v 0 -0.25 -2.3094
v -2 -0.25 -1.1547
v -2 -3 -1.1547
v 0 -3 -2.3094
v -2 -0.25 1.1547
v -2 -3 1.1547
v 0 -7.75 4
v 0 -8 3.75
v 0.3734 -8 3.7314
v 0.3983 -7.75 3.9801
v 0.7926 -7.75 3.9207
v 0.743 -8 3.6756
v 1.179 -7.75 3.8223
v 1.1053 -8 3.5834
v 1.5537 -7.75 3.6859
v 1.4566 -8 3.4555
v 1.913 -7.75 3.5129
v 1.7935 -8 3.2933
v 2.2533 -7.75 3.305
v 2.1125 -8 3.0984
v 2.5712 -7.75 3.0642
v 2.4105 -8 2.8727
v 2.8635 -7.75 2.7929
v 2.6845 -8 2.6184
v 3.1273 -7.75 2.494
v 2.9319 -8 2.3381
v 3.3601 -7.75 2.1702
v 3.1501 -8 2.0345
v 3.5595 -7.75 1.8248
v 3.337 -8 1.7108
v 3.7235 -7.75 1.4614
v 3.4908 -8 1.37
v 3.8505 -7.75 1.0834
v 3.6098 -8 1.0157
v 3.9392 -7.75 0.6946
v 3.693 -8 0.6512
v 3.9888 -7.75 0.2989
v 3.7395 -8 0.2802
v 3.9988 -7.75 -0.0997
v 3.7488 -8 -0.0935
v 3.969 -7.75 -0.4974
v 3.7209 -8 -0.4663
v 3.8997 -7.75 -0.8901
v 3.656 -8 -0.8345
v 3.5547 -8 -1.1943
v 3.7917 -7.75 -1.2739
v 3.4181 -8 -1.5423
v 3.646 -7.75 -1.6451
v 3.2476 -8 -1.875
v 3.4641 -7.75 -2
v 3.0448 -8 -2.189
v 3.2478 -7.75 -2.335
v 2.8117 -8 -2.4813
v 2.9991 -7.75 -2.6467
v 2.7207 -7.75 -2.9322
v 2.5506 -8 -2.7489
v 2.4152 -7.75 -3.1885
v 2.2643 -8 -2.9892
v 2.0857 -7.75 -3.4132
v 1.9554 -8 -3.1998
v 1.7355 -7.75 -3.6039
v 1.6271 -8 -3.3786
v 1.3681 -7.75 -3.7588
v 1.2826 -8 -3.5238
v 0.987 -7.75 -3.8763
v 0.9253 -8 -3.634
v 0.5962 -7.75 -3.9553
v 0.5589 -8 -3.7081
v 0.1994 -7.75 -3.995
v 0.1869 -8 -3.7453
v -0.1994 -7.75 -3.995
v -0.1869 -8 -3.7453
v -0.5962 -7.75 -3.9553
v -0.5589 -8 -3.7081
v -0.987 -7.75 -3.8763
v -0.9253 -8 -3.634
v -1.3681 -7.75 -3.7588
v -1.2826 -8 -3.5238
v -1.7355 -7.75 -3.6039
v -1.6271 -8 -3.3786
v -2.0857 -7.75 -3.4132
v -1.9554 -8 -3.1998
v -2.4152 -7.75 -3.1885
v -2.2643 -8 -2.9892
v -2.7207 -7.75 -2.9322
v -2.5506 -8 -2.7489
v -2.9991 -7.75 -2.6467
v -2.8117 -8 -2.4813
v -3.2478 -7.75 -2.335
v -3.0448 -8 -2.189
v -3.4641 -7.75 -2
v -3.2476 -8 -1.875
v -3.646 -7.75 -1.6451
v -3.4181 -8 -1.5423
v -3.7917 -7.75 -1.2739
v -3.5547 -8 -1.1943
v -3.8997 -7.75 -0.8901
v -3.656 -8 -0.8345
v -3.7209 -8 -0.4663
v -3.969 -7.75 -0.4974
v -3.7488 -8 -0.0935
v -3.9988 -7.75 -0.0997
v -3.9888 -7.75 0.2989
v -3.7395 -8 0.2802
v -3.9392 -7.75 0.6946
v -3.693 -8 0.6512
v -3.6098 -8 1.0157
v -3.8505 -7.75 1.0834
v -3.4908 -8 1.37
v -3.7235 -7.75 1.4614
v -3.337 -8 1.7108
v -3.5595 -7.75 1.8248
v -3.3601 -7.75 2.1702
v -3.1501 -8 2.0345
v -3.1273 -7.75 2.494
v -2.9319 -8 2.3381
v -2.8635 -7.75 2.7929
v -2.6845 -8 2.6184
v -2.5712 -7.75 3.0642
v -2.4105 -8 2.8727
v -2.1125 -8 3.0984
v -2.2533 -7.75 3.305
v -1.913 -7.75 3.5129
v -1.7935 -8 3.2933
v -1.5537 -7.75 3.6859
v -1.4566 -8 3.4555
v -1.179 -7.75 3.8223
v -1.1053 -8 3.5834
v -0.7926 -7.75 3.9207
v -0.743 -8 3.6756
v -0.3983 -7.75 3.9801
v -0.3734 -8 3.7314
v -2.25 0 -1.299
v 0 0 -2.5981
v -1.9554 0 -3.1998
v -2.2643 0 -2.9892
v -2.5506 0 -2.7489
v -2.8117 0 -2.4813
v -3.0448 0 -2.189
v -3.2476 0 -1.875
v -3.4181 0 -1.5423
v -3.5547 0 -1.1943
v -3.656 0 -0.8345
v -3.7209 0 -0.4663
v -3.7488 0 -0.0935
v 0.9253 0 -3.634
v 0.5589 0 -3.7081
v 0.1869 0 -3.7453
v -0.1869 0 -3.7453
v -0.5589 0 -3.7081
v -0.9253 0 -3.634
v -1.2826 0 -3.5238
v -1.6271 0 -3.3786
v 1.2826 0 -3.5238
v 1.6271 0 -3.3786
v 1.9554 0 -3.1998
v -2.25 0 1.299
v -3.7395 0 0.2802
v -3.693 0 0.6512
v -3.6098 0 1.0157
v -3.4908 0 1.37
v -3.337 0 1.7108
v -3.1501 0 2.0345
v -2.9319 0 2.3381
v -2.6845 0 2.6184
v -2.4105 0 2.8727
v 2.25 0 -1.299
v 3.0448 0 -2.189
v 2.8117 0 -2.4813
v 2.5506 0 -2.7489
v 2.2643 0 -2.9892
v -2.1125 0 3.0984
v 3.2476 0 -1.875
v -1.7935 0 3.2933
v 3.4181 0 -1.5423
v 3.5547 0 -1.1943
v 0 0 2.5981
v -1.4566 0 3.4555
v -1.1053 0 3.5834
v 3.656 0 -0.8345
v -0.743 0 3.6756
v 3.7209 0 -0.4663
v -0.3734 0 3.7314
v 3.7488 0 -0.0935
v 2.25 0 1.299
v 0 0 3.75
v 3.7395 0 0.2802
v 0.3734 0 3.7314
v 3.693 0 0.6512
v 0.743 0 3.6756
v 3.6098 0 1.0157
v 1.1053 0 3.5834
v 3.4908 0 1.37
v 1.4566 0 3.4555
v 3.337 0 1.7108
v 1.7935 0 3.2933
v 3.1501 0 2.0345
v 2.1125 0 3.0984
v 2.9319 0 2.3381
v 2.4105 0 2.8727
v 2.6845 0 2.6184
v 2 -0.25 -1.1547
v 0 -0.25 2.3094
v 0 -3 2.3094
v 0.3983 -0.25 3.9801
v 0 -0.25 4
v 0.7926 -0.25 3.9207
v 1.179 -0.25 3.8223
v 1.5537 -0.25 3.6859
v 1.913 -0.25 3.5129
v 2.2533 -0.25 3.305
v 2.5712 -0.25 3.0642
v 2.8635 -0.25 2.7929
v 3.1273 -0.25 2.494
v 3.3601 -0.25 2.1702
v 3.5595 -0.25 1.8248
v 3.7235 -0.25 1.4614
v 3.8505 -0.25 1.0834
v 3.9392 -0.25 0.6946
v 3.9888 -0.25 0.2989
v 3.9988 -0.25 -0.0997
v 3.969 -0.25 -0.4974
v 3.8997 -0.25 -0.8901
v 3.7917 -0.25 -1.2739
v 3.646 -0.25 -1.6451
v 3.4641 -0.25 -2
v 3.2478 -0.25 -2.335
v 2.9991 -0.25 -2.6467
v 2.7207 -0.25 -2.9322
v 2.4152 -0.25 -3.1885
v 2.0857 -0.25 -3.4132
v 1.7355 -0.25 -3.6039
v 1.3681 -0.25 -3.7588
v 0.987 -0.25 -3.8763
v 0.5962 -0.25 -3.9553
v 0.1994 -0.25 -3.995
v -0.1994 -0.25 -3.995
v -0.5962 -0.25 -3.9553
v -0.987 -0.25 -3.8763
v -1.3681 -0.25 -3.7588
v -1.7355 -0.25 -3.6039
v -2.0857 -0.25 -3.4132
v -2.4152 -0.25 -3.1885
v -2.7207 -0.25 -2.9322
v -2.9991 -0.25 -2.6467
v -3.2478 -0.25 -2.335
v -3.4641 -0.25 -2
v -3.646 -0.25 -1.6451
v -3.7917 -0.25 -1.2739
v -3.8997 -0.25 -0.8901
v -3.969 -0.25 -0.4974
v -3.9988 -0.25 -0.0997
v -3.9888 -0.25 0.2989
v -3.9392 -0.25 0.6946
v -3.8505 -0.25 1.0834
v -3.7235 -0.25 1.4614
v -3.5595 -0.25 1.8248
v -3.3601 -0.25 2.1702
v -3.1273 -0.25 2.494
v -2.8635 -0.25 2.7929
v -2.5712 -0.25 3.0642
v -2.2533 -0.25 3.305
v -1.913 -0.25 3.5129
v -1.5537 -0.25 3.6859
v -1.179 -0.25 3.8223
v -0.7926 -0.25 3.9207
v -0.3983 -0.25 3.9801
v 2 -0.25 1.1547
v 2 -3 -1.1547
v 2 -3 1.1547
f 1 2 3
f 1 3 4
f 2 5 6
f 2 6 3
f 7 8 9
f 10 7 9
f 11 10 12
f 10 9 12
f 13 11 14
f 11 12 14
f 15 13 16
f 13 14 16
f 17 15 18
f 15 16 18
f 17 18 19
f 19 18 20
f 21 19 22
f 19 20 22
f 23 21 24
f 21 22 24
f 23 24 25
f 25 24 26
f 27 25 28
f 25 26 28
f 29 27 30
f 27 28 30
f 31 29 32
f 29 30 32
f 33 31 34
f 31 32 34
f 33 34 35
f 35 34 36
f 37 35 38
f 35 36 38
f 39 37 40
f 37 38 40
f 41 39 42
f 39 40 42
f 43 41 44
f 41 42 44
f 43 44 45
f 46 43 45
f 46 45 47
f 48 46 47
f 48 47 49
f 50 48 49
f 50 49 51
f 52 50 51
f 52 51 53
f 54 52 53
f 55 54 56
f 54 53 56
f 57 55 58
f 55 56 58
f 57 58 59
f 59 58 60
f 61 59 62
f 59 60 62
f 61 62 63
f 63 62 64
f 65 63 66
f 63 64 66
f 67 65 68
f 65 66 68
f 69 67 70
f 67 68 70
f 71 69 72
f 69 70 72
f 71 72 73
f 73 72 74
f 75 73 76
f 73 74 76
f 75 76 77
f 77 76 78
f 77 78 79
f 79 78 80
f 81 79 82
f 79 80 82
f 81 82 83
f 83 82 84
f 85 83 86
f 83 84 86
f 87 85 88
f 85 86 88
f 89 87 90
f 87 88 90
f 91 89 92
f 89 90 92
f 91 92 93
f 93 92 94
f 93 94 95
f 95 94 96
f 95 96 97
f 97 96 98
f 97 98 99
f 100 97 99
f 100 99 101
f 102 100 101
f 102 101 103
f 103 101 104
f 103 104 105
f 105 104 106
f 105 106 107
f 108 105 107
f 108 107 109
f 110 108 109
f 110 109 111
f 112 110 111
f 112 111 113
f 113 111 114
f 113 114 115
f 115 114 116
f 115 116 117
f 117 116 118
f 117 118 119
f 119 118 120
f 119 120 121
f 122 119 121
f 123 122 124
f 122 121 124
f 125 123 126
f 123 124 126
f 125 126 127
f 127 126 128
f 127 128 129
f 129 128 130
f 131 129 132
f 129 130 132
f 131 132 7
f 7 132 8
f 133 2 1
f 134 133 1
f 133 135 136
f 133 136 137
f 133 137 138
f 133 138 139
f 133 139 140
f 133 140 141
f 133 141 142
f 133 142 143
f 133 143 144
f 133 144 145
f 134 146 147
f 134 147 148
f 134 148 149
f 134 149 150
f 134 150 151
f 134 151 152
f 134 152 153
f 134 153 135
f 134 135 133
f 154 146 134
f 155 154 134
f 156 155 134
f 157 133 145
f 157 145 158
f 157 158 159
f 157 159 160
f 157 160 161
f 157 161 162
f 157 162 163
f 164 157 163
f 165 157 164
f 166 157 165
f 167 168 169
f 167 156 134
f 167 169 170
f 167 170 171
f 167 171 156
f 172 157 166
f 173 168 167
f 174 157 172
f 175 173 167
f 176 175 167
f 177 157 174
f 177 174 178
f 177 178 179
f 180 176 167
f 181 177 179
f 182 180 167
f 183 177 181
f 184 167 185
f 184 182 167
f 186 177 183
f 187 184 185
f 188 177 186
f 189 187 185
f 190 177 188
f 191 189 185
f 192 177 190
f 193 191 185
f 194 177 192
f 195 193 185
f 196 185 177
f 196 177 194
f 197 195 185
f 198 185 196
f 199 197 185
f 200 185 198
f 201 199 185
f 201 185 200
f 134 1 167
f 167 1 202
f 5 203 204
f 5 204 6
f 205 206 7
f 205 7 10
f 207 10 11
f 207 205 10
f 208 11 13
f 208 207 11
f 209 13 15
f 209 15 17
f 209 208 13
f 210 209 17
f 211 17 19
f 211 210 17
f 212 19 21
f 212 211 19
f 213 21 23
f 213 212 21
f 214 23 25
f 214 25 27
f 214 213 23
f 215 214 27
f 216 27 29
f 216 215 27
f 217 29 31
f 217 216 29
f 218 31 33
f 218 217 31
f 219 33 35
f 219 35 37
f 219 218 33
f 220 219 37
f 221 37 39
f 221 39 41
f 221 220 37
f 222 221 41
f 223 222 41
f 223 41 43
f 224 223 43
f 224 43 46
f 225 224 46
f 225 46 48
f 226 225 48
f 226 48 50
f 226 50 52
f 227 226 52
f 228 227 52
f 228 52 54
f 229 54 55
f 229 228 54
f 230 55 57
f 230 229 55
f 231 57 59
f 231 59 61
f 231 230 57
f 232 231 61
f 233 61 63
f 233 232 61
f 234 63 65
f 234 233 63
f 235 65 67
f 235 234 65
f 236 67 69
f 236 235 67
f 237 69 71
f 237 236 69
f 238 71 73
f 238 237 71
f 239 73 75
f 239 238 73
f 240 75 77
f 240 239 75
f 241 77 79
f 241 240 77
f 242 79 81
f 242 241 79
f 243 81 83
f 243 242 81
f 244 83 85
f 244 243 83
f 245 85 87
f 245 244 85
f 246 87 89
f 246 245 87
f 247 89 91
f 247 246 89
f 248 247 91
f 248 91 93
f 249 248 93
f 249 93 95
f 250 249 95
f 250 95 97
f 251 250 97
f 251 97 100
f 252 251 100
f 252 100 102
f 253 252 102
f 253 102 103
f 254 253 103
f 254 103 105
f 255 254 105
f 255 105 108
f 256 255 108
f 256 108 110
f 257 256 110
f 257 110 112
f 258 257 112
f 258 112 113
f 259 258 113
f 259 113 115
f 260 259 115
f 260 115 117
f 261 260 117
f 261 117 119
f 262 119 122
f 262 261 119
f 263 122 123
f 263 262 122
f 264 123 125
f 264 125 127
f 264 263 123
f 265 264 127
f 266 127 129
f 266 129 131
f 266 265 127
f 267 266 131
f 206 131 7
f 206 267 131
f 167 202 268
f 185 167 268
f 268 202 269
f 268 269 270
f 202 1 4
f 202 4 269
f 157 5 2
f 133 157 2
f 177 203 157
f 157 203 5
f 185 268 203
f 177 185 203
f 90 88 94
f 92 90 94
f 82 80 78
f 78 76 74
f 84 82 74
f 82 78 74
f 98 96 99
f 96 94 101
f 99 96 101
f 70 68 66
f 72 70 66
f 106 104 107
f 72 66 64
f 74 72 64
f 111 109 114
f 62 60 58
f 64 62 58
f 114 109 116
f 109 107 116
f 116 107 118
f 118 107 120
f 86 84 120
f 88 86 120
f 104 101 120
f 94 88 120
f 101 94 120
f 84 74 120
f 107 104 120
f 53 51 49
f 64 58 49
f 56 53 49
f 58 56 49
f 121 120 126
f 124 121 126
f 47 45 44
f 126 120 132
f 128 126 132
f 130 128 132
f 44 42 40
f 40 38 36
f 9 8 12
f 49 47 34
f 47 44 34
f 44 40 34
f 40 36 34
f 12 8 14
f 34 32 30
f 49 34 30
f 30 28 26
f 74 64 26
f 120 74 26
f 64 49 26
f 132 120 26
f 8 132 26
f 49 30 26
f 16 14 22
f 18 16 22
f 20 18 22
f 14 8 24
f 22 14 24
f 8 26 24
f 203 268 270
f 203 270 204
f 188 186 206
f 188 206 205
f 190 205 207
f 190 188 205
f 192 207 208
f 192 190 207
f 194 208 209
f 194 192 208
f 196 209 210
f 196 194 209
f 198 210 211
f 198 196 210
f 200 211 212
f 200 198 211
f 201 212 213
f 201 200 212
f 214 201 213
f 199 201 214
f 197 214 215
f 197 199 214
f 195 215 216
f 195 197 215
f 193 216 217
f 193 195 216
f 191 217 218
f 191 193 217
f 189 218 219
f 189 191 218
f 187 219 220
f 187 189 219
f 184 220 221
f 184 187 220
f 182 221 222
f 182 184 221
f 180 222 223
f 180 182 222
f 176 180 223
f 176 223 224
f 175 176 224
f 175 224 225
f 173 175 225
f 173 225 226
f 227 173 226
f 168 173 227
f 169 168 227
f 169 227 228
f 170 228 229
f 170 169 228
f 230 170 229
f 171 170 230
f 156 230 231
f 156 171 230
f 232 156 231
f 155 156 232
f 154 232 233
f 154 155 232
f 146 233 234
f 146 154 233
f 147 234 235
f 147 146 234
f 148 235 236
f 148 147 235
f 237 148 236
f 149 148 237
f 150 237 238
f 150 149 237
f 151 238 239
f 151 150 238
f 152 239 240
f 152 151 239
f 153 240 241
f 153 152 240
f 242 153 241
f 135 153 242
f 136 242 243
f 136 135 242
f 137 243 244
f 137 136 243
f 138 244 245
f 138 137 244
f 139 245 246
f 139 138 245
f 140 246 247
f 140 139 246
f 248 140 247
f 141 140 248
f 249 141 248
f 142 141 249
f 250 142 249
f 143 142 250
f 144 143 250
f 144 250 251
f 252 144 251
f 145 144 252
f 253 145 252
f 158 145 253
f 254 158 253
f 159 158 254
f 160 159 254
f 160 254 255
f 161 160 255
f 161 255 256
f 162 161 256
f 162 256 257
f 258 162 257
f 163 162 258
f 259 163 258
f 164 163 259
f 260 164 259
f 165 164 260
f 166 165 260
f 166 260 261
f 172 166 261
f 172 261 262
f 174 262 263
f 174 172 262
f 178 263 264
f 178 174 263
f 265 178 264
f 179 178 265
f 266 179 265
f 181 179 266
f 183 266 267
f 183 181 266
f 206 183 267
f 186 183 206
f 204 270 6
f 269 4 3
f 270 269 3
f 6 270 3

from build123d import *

# Parameters (mm, degrees)
SKETCH1_R           = 4
BOSS_EXTRUDE1_DEPTH = 8
CHAMFER1_SIZE       = 0.25
CUT_EXTRUDE1_DEPTH  = 3
CHAMFER2_SIZE       = 0.25


with BuildPart() as part:
    # Sketch1 → Boss-Extrude1 (new body)
    with BuildSketch(Plane(origin=(0, 0, 0), x_dir=(1, 0, 0), z_dir=(0, 1, 0))):
        with Locations(Location((0, 0, 0), (0, 0, 270))):
            Circle(SKETCH1_R)
    extrude(amount=-BOSS_EXTRUDE1_DEPTH)

    # Chamfer1
    chamfer1_edges = [part.edges().sort_by_distance(p)[0] for p in [
        (0, 0, -4),
        (0, -8, -4),
    ]]
    chamfer(chamfer1_edges, length=CHAMFER1_SIZE)

    # Sketch2 → Cut-Extrude1 (cut)
    with BuildSketch(Plane(origin=(0, 0, 0), x_dir=(1, 0, 0), z_dir=(0, 1, 0))):
        Polygon((0, 2.309401077), (2, 1.154700538), (2, -1.154700538), (0, -2.309401077), (-2, -1.154700538), (-2, 1.154700538), align=None)
    extrude(amount=-CUT_EXTRUDE1_DEPTH, mode=Mode.SUBTRACT)

    # Chamfer2
    chamfer2_edges = [part.edges().sort_by_distance(p)[0] for p in [
        (-1, 0, -1.732050808),
        (-2, 0, 0),
        (-1, 0, 1.732050808),
        (1, 0, 1.732050808),
        (2, 0, 0),
        (1, 0, -1.732050808),
    ]]
    chamfer(chamfer2_edges, length=CHAMFER2_SIZE)


solid = part.part
